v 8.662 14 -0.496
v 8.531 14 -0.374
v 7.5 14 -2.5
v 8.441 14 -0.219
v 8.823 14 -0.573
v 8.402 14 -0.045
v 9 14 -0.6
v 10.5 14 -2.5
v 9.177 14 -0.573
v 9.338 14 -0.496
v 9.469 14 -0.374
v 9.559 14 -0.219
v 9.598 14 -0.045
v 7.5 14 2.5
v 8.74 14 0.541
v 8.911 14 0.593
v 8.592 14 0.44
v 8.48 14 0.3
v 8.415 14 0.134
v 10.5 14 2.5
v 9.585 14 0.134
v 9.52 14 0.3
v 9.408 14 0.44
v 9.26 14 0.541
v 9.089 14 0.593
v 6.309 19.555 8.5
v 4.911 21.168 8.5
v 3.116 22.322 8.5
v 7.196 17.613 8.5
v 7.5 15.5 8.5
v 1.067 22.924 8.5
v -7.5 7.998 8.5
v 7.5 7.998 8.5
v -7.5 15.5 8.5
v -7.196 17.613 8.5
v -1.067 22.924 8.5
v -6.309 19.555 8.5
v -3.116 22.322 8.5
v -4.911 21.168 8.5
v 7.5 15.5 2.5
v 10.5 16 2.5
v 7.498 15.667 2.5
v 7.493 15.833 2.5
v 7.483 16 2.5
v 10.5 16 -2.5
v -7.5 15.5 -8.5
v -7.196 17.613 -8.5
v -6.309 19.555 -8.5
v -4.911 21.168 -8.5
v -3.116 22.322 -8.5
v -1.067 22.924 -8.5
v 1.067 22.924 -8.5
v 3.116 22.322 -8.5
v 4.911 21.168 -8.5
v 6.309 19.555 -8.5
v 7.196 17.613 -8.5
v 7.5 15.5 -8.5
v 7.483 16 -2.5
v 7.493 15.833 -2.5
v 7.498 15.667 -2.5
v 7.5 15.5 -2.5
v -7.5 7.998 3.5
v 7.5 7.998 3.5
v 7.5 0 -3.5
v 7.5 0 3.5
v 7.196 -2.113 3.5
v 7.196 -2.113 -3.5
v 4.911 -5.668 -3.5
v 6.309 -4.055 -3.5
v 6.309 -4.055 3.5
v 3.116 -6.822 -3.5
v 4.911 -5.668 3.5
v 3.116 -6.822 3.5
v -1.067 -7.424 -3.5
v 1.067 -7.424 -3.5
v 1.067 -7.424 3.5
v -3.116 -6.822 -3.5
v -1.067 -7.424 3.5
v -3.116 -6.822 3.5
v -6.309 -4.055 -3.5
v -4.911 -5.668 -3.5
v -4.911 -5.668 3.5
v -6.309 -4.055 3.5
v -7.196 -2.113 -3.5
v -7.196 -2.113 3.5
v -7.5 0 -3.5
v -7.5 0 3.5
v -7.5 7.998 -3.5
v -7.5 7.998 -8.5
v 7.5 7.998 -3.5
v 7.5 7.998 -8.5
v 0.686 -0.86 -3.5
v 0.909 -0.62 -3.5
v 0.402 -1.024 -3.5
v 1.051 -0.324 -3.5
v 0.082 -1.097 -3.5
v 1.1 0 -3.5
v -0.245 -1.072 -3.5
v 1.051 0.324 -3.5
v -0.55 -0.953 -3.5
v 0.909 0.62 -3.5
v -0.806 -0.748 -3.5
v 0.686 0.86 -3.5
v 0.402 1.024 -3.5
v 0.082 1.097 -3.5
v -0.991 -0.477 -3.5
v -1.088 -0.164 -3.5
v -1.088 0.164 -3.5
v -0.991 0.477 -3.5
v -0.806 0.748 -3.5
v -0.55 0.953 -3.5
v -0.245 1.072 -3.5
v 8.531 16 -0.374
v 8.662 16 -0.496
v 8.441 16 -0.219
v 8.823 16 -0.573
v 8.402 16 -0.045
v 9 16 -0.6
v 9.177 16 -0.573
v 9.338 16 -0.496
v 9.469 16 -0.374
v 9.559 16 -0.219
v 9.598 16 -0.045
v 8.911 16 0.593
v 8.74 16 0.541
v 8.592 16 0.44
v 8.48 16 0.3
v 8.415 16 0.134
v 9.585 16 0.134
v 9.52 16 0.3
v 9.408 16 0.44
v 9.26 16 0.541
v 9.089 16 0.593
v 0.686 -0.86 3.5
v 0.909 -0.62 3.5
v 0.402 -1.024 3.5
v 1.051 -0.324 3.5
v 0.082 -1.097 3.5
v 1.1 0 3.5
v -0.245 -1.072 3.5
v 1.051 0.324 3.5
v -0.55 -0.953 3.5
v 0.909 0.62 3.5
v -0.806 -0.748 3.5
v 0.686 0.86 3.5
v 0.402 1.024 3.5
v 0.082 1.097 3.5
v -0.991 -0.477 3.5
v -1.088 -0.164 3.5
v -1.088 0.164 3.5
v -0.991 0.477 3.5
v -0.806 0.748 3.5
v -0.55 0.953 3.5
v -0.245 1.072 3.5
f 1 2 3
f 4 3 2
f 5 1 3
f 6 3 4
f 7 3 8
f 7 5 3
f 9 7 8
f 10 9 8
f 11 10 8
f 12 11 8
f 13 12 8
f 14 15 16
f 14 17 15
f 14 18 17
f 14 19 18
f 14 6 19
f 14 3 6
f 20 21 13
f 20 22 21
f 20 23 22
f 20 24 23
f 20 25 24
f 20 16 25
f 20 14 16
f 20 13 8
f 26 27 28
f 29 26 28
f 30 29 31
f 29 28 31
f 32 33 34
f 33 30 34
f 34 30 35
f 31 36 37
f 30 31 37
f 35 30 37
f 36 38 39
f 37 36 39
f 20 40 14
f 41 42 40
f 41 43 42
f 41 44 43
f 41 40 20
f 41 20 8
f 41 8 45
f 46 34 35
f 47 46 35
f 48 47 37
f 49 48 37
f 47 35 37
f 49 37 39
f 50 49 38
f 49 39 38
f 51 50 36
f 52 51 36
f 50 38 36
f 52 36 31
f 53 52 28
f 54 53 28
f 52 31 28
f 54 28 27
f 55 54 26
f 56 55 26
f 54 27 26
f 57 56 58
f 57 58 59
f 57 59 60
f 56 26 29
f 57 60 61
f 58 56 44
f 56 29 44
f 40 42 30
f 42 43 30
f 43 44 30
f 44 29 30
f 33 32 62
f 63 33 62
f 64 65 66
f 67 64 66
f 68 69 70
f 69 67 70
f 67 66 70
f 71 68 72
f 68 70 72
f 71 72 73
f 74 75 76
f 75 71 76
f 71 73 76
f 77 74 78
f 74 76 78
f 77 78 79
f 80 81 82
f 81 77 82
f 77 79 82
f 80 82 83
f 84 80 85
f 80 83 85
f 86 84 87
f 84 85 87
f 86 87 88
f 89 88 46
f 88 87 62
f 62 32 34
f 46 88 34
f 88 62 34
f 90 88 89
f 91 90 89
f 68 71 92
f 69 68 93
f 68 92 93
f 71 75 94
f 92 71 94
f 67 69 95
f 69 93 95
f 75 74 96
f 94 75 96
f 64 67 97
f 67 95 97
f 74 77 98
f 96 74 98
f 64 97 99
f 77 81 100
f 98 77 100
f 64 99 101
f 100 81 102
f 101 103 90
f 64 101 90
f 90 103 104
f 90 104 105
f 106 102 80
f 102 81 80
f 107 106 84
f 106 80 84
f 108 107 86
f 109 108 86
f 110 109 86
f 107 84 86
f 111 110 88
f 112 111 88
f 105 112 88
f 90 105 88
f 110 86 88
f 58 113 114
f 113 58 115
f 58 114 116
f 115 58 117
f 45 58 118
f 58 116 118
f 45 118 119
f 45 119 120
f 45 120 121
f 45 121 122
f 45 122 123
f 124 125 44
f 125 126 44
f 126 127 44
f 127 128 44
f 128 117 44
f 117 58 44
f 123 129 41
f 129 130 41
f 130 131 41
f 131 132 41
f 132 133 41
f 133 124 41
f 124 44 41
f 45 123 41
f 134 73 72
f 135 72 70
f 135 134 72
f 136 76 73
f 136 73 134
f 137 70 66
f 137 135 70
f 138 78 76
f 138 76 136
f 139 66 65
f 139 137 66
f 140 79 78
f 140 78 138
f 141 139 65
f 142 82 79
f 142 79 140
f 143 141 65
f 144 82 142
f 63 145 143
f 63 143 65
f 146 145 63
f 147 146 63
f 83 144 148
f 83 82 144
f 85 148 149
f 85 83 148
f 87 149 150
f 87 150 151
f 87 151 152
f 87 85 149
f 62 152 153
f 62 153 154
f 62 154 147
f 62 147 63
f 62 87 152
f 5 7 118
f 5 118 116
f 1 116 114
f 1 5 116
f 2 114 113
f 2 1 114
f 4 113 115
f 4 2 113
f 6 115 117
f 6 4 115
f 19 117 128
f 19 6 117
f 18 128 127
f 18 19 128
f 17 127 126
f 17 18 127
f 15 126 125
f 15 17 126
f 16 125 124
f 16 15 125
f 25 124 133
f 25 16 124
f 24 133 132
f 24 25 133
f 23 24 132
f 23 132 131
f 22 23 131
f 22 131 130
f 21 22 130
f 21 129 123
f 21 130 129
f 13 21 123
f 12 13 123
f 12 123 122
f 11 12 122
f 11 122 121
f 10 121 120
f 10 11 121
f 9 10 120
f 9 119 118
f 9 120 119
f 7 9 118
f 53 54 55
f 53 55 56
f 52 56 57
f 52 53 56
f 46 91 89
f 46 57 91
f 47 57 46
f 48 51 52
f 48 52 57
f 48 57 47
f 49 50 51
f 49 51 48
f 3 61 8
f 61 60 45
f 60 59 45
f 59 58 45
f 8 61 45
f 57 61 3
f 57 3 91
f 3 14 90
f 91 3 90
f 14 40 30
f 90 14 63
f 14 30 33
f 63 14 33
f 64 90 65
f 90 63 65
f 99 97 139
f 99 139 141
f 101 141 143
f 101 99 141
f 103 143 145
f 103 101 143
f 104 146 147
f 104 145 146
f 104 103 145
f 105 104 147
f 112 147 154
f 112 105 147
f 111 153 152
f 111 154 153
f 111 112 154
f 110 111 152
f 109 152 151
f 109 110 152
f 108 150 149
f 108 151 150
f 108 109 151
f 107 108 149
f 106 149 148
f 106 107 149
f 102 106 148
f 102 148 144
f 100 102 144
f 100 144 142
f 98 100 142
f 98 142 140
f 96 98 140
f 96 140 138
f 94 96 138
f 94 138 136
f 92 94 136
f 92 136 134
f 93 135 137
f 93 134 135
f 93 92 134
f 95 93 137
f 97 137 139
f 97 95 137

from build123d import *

# Parameters (mm, degrees)
LINK1_BODY_DEPTH       = 8.5
TONGUE_CUT_DEPTH       = 29.744564704
TONGUE_CUT_DEPTH_BACK  = 29.744564704
SKETCH1_W              = 5.5
SKETCH1_H              = 15.998130079
PIN_HOLES_DEPTH        = 26.64176281
PIN_HOLES_DEPTH_BACK   = 26.64176281
SKETCH3_R              = 1.1
SKETCH4_W              = 3.5
SKETCH4_H              = 2
GUIDE_BLOCK_1_DEPTH    = 2.5
CORD_GUIDES_DEPTH      = 27.673957337
CORD_GUIDES_DEPTH_BACK = 27.673957337
SKETCH6_R              = 0.6


with BuildPart() as part:
    # Link1_Outline → Link1_Body (new, symmetric)
    with BuildSketch(Plane.XY):
        with BuildLine():
            Line((-7.5, 0), (-7.5, 15.5))
            ThreePointArc((-7.5, 15.5), (0, 23), (7.5, 15.5))
            Line((7.5, 15.5), (7.5, 0))
            ThreePointArc((7.5, 0), (0, -7.5), (-7.5, 0))
        make_face()
    extrude(amount=LINK1_BODY_DEPTH, both=True)

    # Sketch1 → Tongue_Cut (cut, two sides: drawn at the far end of the back side and taken through both)
    with BuildSketch(Plane(origin=(7.5, 0, 0), x_dir=(0, 0, -1), z_dir=(1, 0, 0)).offset(-TONGUE_CUT_DEPTH_BACK)):
        with Locations((6.25, -0.00093496)):
            Rectangle(SKETCH1_W, SKETCH1_H)
        with Locations((-6.25, -0.00093496)):
            Rectangle(SKETCH1_W, SKETCH1_H)
    extrude(amount=TONGUE_CUT_DEPTH + TONGUE_CUT_DEPTH_BACK, mode=Mode.SUBTRACT)

    # Sketch3 → Pin_Holes (cut, two sides: drawn at the far end of the back side and taken through both)
    with BuildSketch(Plane.XY.offset(-PIN_HOLES_DEPTH_BACK)):
        Circle(SKETCH3_R)
    extrude(amount=PIN_HOLES_DEPTH + PIN_HOLES_DEPTH_BACK, mode=Mode.SUBTRACT)

    # Sketch4 → Guide_Block_1 (add, symmetric)
    with BuildSketch(Plane.XY):
        with Locations((8.75, 15)):
            Rectangle(SKETCH4_W, SKETCH4_H)
    extrude(amount=GUIDE_BLOCK_1_DEPTH, both=True)

    # Sketch6 → Cord_Guides (cut, two sides: drawn at the far end of the back side and taken through both)
    with BuildSketch(Plane(origin=(0, 0, 0), x_dir=(1, 0, 0), z_dir=(0, 1, 0)).offset(-CORD_GUIDES_DEPTH_BACK)):
        with Locations(Location((9, 0, 0), (0, 0, 90))):
            Circle(SKETCH6_R)
    extrude(amount=CORD_GUIDES_DEPTH + CORD_GUIDES_DEPTH_BACK, mode=Mode.SUBTRACT)


solid = part.part
